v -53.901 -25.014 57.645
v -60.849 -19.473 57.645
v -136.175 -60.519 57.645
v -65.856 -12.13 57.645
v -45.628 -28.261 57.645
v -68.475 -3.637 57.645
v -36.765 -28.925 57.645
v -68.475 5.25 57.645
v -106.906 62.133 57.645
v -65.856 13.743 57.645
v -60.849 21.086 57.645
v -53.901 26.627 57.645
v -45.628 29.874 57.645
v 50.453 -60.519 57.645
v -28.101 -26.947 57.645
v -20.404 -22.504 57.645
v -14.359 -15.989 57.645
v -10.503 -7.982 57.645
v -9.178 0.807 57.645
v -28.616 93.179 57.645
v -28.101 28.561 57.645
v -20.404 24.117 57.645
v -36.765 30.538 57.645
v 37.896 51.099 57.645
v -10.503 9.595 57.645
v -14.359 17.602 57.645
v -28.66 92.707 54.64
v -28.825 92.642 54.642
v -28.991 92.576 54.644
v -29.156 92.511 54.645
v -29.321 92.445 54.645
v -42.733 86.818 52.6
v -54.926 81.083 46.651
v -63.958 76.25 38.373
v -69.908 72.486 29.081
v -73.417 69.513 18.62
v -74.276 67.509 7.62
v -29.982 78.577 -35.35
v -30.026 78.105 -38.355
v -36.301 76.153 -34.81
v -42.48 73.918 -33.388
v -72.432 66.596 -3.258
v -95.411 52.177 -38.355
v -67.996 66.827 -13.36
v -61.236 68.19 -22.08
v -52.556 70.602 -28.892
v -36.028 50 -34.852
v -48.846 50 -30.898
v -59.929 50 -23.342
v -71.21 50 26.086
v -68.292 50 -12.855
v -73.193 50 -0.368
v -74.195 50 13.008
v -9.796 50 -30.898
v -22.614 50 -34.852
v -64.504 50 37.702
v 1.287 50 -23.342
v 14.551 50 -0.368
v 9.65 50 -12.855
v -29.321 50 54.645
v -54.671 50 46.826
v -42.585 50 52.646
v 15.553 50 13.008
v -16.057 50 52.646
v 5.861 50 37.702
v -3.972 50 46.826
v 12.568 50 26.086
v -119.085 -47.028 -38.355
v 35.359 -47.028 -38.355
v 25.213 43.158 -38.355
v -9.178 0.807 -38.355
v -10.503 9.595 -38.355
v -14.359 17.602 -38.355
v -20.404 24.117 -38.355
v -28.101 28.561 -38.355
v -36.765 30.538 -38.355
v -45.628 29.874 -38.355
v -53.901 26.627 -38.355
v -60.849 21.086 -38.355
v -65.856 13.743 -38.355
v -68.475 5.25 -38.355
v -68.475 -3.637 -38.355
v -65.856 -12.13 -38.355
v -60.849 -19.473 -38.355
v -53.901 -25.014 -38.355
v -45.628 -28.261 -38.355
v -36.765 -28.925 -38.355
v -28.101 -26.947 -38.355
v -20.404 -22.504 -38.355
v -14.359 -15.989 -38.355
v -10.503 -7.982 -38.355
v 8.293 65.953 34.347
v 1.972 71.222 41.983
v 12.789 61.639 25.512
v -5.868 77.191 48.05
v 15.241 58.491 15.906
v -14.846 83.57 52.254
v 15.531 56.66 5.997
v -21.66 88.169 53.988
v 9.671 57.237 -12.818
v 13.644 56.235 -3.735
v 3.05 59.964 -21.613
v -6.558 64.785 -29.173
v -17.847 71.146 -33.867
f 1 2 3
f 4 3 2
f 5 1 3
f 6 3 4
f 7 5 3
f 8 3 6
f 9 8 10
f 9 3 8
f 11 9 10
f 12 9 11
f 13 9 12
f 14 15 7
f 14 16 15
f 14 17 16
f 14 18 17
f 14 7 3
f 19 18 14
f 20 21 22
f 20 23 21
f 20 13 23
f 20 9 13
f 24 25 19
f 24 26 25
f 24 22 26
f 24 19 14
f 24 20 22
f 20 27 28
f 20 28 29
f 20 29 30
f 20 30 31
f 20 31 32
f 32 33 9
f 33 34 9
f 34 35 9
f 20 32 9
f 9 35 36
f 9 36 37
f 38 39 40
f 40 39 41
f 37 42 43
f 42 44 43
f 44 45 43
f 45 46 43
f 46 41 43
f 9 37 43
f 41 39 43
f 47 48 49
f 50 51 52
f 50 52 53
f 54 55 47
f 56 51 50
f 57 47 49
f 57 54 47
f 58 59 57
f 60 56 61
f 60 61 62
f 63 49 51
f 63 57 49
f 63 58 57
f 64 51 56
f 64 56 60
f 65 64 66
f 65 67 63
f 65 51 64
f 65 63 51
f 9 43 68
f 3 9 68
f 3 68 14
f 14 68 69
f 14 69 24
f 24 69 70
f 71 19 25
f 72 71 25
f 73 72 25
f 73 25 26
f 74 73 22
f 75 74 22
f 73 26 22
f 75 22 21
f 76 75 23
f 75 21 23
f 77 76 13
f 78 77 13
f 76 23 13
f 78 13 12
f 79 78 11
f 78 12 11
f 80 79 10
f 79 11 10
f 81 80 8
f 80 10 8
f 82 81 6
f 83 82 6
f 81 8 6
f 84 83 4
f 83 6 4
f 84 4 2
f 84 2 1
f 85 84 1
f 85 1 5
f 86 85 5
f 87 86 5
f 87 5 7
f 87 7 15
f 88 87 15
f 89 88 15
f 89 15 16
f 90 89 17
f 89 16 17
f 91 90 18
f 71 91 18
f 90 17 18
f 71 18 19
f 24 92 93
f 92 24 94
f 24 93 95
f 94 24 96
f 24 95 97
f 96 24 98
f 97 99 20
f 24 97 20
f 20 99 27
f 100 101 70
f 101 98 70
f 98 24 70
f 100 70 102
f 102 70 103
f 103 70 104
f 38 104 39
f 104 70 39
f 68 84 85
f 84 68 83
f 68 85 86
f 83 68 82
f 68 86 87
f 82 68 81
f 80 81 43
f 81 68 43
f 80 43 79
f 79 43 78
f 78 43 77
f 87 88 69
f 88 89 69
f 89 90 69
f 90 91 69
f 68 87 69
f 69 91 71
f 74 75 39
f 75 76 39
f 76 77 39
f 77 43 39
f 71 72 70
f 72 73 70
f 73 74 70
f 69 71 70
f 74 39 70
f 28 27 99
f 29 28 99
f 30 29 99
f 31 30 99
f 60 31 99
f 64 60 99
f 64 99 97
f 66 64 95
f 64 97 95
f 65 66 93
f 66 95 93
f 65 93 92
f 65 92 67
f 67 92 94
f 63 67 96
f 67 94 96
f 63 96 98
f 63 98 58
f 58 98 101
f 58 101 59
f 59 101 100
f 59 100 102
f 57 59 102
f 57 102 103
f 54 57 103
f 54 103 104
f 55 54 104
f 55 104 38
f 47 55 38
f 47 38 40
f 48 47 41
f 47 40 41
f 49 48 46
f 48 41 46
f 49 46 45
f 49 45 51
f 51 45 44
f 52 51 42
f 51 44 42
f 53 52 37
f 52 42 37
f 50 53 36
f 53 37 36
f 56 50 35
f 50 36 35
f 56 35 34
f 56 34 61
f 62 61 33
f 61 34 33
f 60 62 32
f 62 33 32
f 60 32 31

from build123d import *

# Parameters (mm, degrees)
BOSS_EXTRUDE1_DEPTH = 24
BOSS_EXTRUDE1_DRAFT = -8
SCALE1_SCALE        = 4
SKETCH3_R           = 45
CUT_EXTRUDE1_DEPTH  = 88
SKETCH4_R           = 29.815
CUT_EXTRUDE2_DEPTH  = 96


with BuildPart() as part:
    # Sketch1 → Boss-Extrude1 (with draft: the straight prism first)
    with BuildSketch(Plane.XY):
        Polygon((-53.266019417, 16.909847434), (-59.184466019, -7.891262136), (-20.573647712, -7.891262136), (-23.110124827, 14.65520111), (-36.919833564, 23.391955617), align=None)
    extrude(amount=BOSS_EXTRUDE1_DEPTH)
    # Boss-Extrude1: the draft: its side faces are tilted about the plane it starts from
    boss_extrude1_sides = [part.faces().sort_by_distance(p)[0] for p in [
        (-56.225242718, 4.509292649, 12),
        (-39.879056865, -7.891262136, 12),
        (-21.841886269, 3.381969487, 12),
        (-30.014979196, 19.023578363, 12),
        (-45.092926491, 20.150901526, 12),
    ]]
    draft(boss_extrude1_sides, Plane.XY, BOSS_EXTRUDE1_DRAFT)


with BuildPart() as part_1:
    # Scale1: scaled about (-39.217709301, 5.154172018, 12.784931537)
    add(part.part.scale(SCALE1_SCALE).moved(Location((117.653127903, -15.462516054, -38.354794611))))

    # Sketch3 → Cut-Extrude1 (cut)
    with BuildSketch(Plane(origin=(0, 138, 0), x_dir=(1, 0, 0), z_dir=(0, 1, 0))):
        with Locations(Location((-29.321171046, -9.645205389, 0), (0, 0, 270))):
            Circle(SKETCH3_R)
    extrude(amount=-CUT_EXTRUDE1_DEPTH, mode=Mode.SUBTRACT)

    # Sketch4 → Cut-Extrude2 (cut)
    with BuildSketch(Plane.XY.offset(57.645205389)):
        with Locations((-38.993157732, 0.806531709)):
            Circle(SKETCH4_R)
    extrude(amount=-CUT_EXTRUDE2_DEPTH, mode=Mode.SUBTRACT)


solid = part_1.part
